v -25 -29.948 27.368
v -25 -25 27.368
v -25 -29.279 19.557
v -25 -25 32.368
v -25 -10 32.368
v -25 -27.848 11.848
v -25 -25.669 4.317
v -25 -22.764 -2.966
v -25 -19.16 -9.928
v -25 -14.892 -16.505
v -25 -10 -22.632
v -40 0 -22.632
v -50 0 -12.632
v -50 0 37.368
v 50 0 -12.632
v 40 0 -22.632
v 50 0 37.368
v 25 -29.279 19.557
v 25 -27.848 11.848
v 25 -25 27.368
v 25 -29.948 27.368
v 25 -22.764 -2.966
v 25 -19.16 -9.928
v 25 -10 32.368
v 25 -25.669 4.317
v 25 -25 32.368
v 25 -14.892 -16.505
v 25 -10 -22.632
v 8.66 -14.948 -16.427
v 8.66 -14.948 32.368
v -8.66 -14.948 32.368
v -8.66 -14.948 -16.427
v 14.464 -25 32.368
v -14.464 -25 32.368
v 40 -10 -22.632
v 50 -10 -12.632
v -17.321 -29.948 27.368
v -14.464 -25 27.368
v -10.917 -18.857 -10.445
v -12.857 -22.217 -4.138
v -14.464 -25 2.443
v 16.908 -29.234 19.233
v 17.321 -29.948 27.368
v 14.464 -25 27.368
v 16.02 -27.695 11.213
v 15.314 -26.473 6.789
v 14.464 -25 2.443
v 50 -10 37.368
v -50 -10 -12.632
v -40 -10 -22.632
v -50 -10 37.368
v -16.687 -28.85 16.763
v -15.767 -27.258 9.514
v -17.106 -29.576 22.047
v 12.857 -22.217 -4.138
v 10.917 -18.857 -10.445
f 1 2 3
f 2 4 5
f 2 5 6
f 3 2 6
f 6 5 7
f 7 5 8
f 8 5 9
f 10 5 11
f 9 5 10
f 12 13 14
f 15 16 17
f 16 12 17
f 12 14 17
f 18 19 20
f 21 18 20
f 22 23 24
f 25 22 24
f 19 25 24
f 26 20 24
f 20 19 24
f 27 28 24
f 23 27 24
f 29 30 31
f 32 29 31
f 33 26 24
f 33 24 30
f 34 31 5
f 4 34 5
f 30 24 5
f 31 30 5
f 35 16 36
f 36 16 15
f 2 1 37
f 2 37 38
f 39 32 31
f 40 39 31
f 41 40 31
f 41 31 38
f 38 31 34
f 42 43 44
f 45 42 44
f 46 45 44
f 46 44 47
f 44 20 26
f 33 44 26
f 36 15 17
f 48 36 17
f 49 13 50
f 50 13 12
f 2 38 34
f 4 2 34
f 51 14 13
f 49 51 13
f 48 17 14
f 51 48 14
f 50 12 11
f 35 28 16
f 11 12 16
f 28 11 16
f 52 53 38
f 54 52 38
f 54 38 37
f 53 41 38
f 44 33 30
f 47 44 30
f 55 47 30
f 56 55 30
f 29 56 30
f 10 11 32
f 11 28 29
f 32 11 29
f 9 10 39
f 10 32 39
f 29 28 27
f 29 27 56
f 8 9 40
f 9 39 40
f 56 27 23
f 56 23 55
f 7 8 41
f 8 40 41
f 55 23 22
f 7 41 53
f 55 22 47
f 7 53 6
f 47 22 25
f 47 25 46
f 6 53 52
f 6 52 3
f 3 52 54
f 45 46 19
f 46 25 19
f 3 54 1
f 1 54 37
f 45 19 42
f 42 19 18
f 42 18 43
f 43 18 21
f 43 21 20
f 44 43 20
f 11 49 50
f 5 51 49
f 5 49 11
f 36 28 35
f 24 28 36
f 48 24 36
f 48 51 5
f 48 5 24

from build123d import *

# Parameters (mm, degrees)
F1_DEPTH = 10
F2_DEPTH = 30
F4_DEPTH = 75.001
F6_DEPTH = 55.001


with BuildPart() as f1:
    # F0 (on Front) → F1 (new body)
    with BuildSketch(Plane.XZ):
        Polygon((50, 37.368118), (0, 37.368118), (-50, 37.368118), (-50, -12.631882), (-40, -22.631882), (-25, -22.631882), (-25, 32.368118), (25, 32.368118), (25, -22.631882), (40, -22.631882), (50, -12.631882), align=None)
    extrude(amount=F1_DEPTH)

    # F0 (on Front) → F2 (join)
    with BuildSketch(Plane.XZ):
        Polygon((-25, 32.368118), (-25, -22.631882), (0, -22.631882), (25, -22.631882), (25, 32.368118), align=None)
    extrude(amount=F2_DEPTH)

    # F3 (on face) → F4 (cut, through all)
    with BuildSketch(Plane.YZ.offset(25)):
        Polygon((-25, 32.368118), (-30, 32.368118), (-30, 27.368118), (-29.947912, 27.368118), (-25, 27.368118), align=None)
        with BuildLine():
            Line((-29.947912, 27.368118), (-30, 27.368118))
            Line((-30, 27.368118), (-30, -22.631882))
            Line((-30, -22.631882), (-10, -22.631882))
            ThreePointArc((-10, -22.631882), (-24.305881, 0.639861), (-29.947912, 27.368118))
        make_face()
    extrude(amount=-F4_DEPTH, mode=Mode.SUBTRACT)

    # F5 (on face) → F6 (cut, through all)
    with BuildSketch(Plane.XY.offset(32.368118)):
        Polygon((-14.46383, -25), (14.46383, -25), (8.660254, -14.947912), (-8.660254, -14.947912), align=None)
        Polygon((17.320508, -29.947912), (14.46383, -25), (-14.46383, -25), (-17.320508, -29.947912), (0, -29.947912), align=None)
    extrude(amount=-F6_DEPTH, mode=Mode.SUBTRACT)


solid = f1.part
